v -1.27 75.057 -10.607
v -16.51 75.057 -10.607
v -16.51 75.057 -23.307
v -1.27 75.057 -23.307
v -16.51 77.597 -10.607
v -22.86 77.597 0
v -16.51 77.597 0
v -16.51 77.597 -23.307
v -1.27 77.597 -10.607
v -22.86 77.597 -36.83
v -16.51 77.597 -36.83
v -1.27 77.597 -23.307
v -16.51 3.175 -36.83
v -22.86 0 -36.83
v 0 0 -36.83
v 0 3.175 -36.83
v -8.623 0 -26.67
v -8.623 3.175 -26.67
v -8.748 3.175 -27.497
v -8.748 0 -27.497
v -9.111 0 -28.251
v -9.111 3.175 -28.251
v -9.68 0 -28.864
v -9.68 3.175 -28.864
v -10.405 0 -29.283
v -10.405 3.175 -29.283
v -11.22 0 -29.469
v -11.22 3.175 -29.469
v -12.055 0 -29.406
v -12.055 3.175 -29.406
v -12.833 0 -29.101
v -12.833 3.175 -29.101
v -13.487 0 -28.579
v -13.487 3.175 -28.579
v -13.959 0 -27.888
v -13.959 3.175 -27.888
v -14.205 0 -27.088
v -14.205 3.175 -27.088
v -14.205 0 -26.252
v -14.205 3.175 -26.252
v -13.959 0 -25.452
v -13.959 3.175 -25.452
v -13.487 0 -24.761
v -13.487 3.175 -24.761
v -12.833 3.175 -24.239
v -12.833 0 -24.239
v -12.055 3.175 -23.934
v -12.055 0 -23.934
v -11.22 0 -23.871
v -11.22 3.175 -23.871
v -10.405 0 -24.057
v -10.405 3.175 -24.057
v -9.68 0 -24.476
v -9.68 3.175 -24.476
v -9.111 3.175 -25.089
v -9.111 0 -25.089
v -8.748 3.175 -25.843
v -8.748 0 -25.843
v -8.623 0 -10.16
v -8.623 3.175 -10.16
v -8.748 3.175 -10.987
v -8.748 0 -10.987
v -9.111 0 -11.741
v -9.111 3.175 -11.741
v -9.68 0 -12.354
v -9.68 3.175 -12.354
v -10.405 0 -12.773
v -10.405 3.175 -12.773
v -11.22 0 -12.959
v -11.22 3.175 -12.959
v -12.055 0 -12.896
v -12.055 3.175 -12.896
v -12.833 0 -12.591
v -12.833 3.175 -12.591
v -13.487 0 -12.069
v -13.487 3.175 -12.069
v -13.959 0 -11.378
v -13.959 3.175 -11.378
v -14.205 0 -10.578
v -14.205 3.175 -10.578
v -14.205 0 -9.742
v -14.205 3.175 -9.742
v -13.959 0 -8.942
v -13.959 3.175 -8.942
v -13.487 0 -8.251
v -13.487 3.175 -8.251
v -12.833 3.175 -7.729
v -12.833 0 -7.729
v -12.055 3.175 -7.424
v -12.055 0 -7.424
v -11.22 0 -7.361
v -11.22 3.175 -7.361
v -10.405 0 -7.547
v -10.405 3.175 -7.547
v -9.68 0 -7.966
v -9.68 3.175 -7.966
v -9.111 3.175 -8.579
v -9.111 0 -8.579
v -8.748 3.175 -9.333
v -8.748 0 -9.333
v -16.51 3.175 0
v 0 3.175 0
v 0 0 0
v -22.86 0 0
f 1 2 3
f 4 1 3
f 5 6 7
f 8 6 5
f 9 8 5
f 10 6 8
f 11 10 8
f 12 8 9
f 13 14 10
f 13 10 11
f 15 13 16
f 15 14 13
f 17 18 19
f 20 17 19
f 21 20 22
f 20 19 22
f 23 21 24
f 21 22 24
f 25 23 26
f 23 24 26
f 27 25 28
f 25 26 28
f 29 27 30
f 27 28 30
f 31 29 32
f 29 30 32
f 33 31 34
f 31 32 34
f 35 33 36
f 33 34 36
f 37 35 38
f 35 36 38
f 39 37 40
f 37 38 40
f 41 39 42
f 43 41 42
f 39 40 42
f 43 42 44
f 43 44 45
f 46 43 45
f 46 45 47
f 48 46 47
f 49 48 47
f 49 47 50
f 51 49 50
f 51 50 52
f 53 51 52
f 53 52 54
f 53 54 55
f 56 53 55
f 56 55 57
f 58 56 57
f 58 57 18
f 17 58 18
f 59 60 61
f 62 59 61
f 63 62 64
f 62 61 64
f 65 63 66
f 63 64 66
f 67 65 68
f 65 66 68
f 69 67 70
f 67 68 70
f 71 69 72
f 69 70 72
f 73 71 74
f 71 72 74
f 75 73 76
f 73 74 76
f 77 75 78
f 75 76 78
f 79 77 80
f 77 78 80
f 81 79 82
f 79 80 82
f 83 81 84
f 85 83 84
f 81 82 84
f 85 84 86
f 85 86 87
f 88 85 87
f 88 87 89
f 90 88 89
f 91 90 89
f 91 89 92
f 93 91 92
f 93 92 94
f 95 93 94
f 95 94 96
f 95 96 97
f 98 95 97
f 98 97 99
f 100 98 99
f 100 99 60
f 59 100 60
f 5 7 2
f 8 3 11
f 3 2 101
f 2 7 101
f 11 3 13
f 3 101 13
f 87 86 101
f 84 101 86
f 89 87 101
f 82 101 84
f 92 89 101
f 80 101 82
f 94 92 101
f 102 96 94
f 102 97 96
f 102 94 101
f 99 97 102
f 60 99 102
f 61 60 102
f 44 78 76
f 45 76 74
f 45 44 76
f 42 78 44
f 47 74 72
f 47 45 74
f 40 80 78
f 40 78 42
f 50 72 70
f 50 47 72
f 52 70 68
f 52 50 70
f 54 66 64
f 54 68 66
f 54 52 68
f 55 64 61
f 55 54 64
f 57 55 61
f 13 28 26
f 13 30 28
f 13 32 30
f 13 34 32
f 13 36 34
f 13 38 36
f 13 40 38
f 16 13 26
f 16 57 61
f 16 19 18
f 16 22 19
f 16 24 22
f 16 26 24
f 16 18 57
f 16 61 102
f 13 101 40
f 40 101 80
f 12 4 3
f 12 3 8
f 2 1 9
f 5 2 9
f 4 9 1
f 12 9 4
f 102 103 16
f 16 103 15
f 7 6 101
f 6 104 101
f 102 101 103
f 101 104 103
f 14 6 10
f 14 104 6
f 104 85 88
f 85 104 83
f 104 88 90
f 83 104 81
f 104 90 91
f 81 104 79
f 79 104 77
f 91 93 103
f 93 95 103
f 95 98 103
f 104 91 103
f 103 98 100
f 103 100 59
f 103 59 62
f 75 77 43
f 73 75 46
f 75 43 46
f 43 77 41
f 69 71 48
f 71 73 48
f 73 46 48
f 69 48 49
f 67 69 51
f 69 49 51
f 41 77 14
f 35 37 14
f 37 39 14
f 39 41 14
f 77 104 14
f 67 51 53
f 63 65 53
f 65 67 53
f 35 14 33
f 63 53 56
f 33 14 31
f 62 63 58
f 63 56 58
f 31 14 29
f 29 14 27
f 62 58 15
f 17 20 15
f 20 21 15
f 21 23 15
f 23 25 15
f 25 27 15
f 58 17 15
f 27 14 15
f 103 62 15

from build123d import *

# Parameters (mm, degrees)
SKETCH1_W                      = 22.86
SKETCH1_H                      = 36.83
BOSS_EXTRUDE1_DEPTH            = 3.175
SKETCH3_W                      = 6.35
SKETCH3_H                      = 36.83
BOSS_EXTRUDE2_DEPTH            = 74.422
SKETCH4_W                      = 12.7
SKETCH4_H                      = 2.54
BOSS_EXTRUDE3_DEPTH            = 15.24
F_2_0_221_DIAMETER_HOLE1_D     = 5.6134
F_2_0_221_DIAMETER_HOLE1_DEPTH = 3.175


with BuildPart() as part:
    # Sketch1 → Boss-Extrude1 (new body)
    with BuildSketch(Plane(origin=(0, 0, 0), x_dir=(1, 0, 0), z_dir=(0, 1, 0))):
        with Locations((-11.43, 18.415)):
            Rectangle(SKETCH1_W, SKETCH1_H)
    extrude(amount=BOSS_EXTRUDE1_DEPTH)

    # Sketch3 → Boss-Extrude2 (add)
    with BuildSketch(Plane(origin=(0, 3.175, 0), x_dir=(1, 0, 0), z_dir=(0, 1, 0))):
        with Locations((-19.685, 18.415)):
            Rectangle(SKETCH3_W, SKETCH3_H)
    extrude(amount=BOSS_EXTRUDE2_DEPTH)

    # Sketch4 → Boss-Extrude3 (add)
    with BuildSketch(Plane(origin=(-16.51, 0, 0), x_dir=(0, 0, -1), z_dir=(1, 0, 0))):
        with Locations((16.956564639, 76.327)):
            Rectangle(SKETCH4_W, SKETCH4_H)
    extrude(amount=BOSS_EXTRUDE3_DEPTH)

    # #2 (0.221) Diameter Hole1
    with Locations(Plane(origin=(0, 0, 0), x_dir=(-1, 0, 0), z_dir=(0, -1, 0))):
        with Locations((11.43, 10.16), (11.43, 26.67)):
            Hole(F_2_0_221_DIAMETER_HOLE1_D / 2, depth=F_2_0_221_DIAMETER_HOLE1_DEPTH)


solid = part.part
